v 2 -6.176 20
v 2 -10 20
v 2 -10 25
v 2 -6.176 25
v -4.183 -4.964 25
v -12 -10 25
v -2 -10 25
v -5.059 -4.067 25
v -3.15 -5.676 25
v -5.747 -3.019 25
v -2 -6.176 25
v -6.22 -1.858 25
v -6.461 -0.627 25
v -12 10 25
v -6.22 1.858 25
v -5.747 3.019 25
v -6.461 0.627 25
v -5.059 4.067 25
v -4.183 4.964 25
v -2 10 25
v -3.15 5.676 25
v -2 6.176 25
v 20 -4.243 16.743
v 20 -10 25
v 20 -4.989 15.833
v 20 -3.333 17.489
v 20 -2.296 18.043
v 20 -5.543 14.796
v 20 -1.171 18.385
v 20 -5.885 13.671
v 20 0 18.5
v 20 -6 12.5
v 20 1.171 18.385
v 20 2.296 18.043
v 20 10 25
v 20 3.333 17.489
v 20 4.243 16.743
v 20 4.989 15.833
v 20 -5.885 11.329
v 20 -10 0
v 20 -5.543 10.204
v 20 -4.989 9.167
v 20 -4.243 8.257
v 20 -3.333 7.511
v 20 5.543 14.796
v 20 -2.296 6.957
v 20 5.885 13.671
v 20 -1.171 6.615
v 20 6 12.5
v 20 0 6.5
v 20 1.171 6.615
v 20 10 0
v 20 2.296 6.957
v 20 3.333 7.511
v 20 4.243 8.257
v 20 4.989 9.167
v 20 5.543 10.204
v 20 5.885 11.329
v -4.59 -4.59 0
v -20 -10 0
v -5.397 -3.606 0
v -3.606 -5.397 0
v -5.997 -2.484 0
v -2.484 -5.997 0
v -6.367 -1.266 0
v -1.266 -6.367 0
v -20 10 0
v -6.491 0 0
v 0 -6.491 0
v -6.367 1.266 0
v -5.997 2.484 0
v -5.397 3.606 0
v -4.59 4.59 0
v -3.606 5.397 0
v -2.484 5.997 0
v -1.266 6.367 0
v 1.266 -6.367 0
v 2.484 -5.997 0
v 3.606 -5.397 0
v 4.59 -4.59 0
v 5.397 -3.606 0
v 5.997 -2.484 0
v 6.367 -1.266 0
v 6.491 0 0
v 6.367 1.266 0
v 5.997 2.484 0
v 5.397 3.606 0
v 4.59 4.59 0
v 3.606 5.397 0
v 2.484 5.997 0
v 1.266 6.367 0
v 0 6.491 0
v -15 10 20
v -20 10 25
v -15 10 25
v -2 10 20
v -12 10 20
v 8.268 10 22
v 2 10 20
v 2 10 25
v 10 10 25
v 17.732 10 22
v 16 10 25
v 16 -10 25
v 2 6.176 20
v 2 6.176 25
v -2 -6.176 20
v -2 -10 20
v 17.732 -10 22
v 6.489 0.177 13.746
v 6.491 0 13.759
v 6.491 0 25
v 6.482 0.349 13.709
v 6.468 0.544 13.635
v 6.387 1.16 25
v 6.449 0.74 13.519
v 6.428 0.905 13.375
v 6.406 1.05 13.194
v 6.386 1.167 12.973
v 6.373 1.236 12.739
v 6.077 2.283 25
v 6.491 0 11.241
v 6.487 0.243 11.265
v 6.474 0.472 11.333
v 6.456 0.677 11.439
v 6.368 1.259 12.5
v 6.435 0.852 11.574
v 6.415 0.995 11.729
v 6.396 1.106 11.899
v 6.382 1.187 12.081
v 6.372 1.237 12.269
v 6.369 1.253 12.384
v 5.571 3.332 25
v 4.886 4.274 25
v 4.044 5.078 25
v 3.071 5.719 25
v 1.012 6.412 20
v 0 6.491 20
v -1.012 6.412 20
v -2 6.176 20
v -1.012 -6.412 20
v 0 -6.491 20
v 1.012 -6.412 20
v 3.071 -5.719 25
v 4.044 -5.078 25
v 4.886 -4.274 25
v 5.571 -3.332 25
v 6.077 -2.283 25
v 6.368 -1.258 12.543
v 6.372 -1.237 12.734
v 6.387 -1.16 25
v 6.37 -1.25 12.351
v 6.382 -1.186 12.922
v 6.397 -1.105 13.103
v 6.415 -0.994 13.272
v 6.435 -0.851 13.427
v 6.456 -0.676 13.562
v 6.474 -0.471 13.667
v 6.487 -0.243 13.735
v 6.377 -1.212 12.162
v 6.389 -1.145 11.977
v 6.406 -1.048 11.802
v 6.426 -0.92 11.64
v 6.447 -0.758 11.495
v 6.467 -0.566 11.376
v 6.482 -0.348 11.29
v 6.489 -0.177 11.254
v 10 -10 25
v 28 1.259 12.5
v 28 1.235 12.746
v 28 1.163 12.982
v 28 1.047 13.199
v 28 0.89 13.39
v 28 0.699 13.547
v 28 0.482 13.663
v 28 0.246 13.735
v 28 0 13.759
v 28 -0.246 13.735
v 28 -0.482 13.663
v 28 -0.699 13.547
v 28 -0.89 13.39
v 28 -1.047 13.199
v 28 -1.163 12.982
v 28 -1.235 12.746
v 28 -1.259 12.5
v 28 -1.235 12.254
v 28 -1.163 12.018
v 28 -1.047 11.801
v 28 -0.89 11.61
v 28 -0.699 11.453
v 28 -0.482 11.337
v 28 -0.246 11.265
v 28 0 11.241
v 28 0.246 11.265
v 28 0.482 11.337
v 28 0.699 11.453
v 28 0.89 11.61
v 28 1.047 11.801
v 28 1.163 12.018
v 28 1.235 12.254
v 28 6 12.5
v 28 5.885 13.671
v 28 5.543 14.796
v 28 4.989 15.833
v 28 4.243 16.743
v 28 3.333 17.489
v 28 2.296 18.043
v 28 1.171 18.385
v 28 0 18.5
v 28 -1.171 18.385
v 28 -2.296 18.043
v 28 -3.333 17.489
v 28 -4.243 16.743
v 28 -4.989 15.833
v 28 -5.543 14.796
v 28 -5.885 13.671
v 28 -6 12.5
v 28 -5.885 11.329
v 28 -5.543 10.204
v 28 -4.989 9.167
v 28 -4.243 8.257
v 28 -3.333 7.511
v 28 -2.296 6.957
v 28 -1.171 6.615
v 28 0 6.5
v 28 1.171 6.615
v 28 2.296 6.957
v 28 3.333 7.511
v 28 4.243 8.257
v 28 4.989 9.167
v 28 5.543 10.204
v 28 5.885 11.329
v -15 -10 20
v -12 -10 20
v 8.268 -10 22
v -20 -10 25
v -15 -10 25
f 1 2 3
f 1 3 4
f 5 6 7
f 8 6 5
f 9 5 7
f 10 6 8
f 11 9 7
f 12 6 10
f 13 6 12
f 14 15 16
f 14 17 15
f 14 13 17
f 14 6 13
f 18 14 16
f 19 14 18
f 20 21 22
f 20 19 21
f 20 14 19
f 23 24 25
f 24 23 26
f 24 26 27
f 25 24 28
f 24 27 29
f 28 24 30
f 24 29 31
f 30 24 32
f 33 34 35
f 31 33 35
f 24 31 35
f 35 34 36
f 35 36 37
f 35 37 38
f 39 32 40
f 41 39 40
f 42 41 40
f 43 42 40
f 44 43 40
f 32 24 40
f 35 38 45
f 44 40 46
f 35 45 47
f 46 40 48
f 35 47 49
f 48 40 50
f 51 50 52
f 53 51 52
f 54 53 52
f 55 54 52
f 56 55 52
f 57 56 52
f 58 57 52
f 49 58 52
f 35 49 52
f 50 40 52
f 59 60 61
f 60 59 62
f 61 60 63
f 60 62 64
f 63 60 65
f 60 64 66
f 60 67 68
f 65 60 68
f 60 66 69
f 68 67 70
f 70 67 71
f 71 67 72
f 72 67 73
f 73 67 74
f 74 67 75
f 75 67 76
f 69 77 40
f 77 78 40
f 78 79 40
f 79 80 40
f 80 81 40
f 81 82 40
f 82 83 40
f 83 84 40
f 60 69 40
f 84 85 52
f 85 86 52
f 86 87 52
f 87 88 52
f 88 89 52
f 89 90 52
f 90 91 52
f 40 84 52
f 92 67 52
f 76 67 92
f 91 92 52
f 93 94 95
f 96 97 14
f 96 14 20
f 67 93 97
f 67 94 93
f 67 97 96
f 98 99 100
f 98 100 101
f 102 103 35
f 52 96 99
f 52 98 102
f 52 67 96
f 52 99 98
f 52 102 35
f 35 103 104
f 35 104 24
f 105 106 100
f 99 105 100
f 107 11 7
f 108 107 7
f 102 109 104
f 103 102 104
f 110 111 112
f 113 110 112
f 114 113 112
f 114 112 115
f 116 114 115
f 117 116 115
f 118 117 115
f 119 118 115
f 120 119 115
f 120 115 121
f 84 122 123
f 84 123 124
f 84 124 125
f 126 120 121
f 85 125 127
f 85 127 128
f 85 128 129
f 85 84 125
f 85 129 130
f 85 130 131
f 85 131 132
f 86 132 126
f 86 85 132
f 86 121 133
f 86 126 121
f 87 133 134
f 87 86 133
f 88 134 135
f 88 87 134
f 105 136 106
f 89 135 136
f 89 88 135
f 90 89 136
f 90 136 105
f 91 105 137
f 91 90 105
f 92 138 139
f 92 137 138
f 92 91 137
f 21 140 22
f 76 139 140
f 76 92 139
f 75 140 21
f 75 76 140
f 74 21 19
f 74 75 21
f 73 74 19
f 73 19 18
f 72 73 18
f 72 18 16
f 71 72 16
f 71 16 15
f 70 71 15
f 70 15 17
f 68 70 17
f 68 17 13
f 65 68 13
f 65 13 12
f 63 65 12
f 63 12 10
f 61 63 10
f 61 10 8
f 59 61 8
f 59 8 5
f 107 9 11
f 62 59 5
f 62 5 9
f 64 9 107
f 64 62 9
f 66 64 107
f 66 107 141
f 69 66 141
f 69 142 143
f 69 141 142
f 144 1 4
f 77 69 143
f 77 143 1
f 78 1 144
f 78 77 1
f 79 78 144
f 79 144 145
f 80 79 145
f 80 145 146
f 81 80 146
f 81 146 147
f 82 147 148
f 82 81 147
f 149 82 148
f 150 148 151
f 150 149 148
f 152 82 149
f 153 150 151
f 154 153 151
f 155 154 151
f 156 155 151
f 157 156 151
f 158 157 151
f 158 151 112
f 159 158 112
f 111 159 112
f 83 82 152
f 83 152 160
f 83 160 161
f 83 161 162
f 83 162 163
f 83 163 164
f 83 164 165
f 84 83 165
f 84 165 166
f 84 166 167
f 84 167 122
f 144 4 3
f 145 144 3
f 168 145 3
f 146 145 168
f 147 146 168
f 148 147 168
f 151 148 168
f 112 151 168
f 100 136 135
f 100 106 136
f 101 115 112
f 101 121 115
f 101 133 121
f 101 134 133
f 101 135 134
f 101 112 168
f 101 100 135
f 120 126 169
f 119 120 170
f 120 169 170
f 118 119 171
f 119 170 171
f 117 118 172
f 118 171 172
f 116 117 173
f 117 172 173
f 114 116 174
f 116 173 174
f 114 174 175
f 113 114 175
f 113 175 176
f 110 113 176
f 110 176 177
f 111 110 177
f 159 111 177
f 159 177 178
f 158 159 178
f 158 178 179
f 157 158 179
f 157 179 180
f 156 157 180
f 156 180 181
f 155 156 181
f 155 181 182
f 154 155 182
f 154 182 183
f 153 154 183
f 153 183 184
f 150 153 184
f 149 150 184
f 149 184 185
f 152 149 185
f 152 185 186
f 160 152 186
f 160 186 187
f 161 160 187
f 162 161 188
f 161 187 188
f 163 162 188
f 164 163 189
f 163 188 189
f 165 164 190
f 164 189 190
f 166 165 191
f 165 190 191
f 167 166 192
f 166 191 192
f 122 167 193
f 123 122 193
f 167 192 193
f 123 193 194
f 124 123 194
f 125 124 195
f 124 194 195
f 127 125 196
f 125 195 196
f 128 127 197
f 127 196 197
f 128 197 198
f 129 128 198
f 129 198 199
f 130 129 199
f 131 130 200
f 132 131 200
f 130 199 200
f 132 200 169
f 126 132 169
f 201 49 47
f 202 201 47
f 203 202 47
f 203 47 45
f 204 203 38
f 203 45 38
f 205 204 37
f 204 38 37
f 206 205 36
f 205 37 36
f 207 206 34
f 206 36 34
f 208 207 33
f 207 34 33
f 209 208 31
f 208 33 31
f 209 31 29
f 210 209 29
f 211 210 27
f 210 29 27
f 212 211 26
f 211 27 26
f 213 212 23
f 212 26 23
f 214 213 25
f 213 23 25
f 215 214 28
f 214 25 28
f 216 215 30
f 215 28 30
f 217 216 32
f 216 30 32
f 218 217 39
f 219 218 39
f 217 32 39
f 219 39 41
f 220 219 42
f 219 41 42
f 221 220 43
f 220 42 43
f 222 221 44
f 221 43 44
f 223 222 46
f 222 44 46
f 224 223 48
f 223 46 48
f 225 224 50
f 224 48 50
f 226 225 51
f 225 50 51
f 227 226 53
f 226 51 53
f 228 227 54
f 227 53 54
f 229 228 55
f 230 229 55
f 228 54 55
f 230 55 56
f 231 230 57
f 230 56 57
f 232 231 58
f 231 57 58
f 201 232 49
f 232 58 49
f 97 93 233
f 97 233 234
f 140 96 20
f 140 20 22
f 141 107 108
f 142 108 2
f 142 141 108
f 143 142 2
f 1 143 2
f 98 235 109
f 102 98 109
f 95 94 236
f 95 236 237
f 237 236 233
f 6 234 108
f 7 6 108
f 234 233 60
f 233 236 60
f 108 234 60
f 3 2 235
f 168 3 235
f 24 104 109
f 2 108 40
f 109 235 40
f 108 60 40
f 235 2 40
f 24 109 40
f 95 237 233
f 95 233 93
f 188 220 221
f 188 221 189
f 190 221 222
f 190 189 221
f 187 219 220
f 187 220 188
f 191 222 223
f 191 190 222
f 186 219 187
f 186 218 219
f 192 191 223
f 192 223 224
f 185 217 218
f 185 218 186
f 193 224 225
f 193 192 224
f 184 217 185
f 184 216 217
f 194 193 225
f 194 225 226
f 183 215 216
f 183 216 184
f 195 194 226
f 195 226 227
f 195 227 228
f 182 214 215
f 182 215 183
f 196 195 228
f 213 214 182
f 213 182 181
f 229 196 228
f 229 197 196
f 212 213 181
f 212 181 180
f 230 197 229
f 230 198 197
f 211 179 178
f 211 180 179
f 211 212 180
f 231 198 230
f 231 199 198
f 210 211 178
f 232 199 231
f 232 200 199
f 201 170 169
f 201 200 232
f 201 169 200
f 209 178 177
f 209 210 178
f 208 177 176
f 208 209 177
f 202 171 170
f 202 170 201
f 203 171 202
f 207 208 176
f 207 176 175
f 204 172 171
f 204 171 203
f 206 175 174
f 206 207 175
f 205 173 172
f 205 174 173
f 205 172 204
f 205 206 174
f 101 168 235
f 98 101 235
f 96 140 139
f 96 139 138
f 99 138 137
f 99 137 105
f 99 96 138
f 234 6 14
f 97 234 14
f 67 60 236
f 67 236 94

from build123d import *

# Parameters (mm, degrees)
F0_W     = 40
F0_H     = 20
F0_R     = 6.491314
F1_DEPTH = 25
F2_W     = 3
F2_H     = 20
F3_DEPTH = 5
F5_DEPTH = 20.001
F6_R     = 6
F7_DEPTH = 8
F8_R     = 1.258823
F9_DEPTH = 25


with BuildPart() as f1:
    # F0 (on Top) → F1 (new body)
    with BuildSketch(Plane.XY):
        Rectangle(F0_W, F0_H)
        Circle(F0_R, mode=Mode.SUBTRACT)
    extrude(amount=F1_DEPTH)

    # F2 (on face) → F3 (cut)
    with BuildSketch(Plane.XY.offset(25)):
        with Locations((-13.5, 0)):
            Rectangle(F2_W, F2_H)
        with BuildLine():
            Line((2, 10), (-2, 10))
            Line((-2, 10), (-2, 6.175529))
            ThreePointArc((-2, 6.175529), (0, 6.491314), (2, 6.175529))
            Line((2, 6.175529), (2, 10))
        make_face()
        with BuildLine():
            Line((-2, -6.175529), (-2, -10))
            Line((-2, -10), (2, -10))
            Line((2, -10), (2, -6.175529))
            ThreePointArc((2, -6.175529), (0, -6.491314), (-2, -6.175529))
        make_face()
    extrude(amount=-F3_DEPTH, mode=Mode.SUBTRACT)

    # F4 (on face) → F5 (cut, through all)
    with BuildSketch(Plane.XZ.offset(10)):
        Polygon((16, 25), (10, 25), (8.267949, 22), (17.732051, 22), align=None)
    extrude(amount=-F5_DEPTH, mode=Mode.SUBTRACT)

    # F6 (on face) → F7 (join)
    with BuildSketch(Plane.YZ.offset(20)):
        with Locations((0, 12.5)):
            Circle(F6_R)
    extrude(amount=F7_DEPTH)

    # F8 (on face) → F9 (cut)
    with BuildSketch(Plane.YZ.offset(28)):
        with Locations((0, 12.5)):
            Circle(F8_R)
    extrude(amount=-F9_DEPTH, mode=Mode.SUBTRACT)


solid = f1.part
